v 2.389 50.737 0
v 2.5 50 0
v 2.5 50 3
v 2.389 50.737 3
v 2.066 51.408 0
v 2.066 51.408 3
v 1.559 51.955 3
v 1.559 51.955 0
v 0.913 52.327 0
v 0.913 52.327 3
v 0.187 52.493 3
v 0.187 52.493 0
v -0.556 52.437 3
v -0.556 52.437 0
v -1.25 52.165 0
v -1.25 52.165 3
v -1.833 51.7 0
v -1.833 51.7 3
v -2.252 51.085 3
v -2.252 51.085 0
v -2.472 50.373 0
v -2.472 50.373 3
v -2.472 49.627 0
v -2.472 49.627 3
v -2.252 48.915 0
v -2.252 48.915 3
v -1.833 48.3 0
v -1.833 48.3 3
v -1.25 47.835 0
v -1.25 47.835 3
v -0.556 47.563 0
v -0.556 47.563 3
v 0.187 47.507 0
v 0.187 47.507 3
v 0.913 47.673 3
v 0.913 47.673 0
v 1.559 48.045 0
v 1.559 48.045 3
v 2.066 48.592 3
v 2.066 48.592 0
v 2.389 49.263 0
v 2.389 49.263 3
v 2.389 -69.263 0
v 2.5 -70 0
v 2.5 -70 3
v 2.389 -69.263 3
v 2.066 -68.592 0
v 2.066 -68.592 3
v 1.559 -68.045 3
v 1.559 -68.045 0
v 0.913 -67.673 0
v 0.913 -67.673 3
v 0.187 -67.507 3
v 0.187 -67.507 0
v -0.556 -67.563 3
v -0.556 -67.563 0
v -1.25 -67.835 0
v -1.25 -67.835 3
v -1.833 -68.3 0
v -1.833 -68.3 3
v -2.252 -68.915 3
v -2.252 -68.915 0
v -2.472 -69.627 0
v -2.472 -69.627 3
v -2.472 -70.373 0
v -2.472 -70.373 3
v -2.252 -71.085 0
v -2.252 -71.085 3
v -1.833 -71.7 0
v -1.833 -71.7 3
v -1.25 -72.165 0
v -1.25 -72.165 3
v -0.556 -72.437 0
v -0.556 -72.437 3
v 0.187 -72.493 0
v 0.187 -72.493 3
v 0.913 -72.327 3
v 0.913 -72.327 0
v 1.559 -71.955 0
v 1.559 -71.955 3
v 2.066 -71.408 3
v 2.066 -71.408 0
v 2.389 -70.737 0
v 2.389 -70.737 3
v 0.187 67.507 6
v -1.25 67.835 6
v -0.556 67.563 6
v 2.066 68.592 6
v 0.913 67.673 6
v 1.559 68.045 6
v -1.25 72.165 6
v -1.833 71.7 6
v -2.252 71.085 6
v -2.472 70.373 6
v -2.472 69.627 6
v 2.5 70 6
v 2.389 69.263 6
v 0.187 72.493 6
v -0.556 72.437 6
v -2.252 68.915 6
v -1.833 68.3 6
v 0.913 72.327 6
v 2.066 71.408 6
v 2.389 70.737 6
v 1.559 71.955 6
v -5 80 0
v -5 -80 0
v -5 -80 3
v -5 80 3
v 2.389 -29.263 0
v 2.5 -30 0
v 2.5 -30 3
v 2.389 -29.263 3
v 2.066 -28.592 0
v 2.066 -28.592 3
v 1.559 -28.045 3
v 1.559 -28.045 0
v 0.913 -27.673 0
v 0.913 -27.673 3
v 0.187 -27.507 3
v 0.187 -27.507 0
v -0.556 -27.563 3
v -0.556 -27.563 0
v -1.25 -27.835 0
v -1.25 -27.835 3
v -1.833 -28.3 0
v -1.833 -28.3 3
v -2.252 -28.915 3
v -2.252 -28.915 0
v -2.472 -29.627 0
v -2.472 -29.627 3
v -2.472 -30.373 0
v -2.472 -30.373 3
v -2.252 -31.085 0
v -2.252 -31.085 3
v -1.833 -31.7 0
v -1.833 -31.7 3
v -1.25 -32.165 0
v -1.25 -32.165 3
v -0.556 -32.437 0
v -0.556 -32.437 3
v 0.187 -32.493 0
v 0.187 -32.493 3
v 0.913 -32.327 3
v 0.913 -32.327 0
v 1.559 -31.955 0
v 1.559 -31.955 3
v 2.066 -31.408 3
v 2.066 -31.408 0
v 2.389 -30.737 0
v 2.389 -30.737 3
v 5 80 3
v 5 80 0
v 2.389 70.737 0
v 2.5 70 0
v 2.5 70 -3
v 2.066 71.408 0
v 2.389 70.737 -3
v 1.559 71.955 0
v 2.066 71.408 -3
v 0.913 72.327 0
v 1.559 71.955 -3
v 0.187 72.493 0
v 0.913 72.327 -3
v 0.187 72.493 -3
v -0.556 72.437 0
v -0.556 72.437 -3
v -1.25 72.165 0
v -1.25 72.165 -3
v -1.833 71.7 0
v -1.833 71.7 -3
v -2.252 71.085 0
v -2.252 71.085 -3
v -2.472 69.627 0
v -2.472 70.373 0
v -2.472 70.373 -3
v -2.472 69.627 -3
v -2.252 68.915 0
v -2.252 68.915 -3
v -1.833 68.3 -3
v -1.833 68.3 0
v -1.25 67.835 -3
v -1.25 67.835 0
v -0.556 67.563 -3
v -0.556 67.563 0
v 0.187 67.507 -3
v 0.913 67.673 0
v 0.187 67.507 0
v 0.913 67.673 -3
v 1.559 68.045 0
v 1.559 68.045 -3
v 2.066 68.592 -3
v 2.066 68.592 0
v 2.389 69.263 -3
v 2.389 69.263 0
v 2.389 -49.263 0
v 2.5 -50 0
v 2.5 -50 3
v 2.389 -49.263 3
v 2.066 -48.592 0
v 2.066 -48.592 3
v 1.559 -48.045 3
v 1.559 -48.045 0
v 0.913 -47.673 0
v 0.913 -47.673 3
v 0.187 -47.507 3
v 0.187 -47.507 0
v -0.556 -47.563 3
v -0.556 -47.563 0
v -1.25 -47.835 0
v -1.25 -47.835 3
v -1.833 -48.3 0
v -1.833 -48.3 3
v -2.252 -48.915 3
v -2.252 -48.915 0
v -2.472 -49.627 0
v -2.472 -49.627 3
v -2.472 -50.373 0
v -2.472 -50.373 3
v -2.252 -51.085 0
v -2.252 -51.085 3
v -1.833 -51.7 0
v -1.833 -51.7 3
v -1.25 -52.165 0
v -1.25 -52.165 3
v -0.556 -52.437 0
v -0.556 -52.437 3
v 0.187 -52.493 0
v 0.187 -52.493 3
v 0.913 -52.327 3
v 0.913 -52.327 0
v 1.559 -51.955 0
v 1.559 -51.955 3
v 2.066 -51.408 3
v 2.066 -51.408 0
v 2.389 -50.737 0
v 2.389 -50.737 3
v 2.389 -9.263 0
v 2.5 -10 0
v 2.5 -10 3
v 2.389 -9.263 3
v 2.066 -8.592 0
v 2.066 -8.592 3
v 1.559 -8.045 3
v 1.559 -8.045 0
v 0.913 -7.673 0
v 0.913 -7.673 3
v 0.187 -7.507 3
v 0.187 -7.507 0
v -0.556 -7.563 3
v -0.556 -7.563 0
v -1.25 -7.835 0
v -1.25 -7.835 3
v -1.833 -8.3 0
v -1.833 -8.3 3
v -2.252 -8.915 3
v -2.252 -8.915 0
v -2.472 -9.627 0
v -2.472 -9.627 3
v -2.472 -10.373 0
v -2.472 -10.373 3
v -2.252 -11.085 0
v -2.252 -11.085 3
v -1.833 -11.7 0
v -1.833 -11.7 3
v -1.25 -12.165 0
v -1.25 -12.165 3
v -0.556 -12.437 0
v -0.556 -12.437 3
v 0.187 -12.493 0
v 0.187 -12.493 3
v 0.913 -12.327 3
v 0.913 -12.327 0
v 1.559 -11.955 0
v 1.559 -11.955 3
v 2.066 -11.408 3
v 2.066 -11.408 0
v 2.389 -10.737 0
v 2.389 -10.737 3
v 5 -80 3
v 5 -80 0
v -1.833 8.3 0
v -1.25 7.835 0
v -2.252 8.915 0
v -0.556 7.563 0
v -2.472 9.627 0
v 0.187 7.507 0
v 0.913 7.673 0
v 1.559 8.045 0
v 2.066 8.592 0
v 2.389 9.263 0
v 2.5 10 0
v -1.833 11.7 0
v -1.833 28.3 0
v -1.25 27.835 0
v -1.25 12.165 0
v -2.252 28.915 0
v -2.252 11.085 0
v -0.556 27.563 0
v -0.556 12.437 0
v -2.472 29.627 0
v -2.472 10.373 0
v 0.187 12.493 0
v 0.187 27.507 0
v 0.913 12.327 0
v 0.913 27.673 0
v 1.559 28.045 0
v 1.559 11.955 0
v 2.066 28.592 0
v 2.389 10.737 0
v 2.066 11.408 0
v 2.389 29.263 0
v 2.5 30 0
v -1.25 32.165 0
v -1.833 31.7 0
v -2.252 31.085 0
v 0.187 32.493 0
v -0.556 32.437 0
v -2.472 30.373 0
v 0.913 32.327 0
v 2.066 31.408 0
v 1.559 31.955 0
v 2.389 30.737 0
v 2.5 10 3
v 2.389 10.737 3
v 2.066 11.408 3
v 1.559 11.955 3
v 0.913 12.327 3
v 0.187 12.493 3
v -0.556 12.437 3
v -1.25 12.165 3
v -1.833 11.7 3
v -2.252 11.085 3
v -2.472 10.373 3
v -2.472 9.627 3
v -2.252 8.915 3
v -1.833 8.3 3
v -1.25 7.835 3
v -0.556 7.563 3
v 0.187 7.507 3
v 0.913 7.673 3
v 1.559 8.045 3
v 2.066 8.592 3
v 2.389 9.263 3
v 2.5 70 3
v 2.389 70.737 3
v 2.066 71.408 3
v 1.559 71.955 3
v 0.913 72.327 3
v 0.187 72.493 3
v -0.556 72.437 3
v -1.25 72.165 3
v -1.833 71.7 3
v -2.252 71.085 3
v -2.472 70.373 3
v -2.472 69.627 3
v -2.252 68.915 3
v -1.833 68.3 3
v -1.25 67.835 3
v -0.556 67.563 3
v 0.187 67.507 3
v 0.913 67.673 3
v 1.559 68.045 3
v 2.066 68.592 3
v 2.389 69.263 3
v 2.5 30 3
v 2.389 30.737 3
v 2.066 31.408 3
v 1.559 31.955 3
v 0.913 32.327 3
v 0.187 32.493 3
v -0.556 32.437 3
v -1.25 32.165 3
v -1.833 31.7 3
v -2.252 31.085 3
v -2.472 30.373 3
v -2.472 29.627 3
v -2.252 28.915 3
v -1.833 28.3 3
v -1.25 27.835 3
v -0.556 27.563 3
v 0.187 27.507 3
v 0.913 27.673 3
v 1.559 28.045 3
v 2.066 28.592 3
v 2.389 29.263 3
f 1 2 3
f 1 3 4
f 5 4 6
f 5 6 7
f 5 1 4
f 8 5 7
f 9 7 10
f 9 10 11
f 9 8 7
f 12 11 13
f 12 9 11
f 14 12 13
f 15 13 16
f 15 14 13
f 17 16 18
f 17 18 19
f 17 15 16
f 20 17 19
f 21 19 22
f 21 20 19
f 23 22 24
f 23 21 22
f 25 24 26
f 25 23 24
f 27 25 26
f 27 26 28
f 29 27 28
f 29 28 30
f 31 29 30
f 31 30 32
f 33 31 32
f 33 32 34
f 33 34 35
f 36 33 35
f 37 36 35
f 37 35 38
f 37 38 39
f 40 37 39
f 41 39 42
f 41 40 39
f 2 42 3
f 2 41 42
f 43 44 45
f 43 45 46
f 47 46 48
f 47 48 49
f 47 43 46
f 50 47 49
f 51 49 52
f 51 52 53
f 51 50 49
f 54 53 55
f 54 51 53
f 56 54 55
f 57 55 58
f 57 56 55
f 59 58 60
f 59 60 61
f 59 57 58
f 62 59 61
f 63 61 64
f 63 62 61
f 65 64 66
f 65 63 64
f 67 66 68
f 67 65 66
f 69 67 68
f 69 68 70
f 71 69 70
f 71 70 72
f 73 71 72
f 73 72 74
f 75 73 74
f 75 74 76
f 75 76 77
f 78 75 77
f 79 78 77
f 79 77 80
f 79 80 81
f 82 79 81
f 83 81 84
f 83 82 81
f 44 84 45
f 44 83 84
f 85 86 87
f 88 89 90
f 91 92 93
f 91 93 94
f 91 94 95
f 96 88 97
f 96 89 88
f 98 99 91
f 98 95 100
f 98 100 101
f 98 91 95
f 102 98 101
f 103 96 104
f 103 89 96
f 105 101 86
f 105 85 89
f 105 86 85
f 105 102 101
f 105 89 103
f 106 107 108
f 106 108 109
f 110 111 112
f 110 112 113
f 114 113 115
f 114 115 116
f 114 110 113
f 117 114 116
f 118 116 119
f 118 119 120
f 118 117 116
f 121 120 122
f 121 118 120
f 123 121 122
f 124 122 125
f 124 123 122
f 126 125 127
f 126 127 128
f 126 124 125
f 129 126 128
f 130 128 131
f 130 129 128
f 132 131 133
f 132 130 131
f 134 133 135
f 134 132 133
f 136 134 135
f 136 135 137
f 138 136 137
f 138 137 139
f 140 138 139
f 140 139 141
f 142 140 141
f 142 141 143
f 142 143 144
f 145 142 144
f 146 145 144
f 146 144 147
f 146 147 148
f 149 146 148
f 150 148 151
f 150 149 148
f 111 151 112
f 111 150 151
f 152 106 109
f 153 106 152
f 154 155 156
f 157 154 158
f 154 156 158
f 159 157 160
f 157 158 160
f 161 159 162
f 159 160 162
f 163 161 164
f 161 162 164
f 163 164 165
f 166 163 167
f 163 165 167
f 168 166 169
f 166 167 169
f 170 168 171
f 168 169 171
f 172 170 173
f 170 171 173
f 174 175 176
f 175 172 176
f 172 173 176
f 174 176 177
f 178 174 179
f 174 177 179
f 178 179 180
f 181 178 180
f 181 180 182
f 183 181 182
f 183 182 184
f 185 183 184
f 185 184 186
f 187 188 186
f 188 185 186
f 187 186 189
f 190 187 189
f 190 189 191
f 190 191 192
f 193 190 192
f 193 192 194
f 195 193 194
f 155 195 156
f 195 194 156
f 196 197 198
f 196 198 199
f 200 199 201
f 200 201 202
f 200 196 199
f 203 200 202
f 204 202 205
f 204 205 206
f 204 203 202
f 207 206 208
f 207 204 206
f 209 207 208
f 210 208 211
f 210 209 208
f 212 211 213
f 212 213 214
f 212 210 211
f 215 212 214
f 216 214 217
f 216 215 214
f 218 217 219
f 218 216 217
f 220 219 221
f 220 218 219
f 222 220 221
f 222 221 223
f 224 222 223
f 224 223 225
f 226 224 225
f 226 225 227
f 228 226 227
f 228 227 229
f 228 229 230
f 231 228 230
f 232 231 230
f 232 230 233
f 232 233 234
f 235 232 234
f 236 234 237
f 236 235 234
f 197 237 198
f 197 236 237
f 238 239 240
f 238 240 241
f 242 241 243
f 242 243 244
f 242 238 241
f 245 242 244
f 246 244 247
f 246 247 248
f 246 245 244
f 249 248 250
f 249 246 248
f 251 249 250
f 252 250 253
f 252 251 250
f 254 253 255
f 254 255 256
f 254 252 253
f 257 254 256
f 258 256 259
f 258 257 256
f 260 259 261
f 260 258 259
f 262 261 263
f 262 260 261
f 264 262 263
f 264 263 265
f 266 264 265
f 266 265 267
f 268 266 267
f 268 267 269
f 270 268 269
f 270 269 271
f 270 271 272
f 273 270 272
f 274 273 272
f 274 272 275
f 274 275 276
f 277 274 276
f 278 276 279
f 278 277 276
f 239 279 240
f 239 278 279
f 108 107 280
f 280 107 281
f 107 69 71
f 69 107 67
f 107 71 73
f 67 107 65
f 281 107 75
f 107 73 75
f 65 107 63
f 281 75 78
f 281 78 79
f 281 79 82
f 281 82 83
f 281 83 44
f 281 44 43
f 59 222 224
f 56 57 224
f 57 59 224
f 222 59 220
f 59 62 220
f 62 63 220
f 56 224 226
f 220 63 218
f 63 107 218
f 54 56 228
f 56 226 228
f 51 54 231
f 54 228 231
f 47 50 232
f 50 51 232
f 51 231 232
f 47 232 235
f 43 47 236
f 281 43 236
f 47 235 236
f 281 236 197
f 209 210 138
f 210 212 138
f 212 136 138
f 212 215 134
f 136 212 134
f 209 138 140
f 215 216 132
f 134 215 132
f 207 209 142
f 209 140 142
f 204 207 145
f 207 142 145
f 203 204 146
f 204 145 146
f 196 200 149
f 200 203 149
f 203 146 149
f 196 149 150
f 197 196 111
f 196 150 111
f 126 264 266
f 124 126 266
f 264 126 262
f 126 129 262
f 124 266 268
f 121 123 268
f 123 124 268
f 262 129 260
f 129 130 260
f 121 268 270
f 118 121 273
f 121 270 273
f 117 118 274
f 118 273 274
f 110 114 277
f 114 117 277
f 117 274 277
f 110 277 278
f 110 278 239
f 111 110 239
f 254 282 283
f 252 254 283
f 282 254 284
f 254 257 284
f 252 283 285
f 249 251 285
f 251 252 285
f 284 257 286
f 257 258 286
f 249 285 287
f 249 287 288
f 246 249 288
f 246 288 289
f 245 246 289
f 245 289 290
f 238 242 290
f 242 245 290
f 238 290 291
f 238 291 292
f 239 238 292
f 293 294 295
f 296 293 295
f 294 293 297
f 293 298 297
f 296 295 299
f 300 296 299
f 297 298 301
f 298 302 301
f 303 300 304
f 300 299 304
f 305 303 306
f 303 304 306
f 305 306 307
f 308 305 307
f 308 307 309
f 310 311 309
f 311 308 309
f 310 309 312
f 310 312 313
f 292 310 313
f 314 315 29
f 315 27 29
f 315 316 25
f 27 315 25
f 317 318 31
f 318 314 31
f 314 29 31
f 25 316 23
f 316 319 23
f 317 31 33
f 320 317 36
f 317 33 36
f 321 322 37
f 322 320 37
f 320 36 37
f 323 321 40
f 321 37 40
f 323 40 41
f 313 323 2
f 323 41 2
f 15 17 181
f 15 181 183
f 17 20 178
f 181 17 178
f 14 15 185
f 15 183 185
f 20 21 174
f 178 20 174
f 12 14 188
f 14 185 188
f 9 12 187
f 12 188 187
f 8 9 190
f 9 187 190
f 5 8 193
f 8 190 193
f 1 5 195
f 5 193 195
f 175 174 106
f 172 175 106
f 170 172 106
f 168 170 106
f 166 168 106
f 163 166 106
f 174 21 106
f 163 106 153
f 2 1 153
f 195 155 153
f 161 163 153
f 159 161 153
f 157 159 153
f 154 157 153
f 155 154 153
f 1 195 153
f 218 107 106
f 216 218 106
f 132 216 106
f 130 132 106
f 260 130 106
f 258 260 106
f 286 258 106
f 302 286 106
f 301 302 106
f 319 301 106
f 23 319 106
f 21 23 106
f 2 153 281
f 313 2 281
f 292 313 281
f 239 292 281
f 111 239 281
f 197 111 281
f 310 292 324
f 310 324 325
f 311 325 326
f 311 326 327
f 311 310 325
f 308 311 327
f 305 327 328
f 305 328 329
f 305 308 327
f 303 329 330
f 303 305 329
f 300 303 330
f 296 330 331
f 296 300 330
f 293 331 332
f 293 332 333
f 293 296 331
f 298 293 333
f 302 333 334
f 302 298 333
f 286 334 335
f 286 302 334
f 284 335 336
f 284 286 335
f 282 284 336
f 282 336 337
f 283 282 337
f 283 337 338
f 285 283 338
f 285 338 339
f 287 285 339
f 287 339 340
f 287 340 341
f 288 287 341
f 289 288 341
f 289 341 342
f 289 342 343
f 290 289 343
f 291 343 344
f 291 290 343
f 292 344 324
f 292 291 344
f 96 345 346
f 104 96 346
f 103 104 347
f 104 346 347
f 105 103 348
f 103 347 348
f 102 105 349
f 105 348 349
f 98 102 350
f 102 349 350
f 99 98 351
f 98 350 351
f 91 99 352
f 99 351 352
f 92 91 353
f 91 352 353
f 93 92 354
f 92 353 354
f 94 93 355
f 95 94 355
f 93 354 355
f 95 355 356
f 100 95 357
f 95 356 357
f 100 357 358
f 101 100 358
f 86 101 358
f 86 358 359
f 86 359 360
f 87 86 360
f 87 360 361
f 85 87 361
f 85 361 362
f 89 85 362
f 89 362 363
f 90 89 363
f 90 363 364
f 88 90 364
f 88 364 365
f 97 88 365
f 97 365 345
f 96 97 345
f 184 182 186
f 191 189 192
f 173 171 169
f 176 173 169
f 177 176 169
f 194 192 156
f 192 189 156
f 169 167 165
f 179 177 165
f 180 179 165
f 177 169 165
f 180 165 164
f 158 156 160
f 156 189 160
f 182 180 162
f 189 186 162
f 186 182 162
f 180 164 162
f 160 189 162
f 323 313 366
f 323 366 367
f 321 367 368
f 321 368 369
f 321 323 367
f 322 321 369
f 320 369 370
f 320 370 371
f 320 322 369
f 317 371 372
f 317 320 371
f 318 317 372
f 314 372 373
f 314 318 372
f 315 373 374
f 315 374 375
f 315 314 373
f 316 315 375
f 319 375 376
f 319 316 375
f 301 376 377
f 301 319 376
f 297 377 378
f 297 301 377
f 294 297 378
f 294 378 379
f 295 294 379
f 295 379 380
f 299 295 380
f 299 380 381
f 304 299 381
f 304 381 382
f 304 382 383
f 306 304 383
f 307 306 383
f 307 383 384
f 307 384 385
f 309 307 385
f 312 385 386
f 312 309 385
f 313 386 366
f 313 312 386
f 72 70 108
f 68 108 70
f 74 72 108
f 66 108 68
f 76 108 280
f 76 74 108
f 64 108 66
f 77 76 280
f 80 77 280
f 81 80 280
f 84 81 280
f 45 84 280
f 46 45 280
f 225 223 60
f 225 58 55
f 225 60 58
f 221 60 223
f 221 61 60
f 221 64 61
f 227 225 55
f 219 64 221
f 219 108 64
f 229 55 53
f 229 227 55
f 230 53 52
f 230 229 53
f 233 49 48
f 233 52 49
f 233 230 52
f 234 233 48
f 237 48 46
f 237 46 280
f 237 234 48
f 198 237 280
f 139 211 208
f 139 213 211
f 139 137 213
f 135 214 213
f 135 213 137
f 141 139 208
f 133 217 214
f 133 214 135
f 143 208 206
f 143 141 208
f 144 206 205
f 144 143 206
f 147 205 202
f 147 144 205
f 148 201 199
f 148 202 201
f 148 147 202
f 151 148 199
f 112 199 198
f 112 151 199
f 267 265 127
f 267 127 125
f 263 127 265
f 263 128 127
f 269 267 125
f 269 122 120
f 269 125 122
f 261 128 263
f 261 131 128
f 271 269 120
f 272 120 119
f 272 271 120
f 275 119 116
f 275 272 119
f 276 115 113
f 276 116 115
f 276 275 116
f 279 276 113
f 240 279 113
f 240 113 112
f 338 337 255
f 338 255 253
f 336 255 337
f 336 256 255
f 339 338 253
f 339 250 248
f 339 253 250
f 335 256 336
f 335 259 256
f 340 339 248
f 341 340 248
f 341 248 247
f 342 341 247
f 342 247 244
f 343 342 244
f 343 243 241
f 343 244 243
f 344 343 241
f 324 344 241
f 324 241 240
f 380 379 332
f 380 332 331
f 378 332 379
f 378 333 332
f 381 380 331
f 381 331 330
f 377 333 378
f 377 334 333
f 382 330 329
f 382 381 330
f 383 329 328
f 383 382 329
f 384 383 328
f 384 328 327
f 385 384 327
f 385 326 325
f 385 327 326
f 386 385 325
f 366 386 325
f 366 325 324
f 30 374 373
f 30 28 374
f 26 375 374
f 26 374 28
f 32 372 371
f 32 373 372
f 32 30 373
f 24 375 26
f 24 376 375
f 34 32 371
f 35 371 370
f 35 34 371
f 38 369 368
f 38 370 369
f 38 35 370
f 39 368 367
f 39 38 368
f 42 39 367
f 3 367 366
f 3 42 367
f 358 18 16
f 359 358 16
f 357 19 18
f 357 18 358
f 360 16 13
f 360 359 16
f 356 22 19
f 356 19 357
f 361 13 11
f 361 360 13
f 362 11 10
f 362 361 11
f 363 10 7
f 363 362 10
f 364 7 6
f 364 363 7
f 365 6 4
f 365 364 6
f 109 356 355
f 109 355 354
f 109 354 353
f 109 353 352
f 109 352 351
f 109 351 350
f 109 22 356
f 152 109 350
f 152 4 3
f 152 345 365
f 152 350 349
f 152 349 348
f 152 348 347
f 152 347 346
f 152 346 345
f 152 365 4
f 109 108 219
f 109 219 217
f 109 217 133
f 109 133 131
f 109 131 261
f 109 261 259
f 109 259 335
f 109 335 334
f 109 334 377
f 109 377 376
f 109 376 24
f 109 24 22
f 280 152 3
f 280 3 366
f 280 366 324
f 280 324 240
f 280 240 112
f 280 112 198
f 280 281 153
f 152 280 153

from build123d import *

# Parameters (mm, degrees)
SKETCH_1_W           = 10
SKETCH_1_H           = 160
SKETCH_1_R           = 2.5
EXTRUDE_1_DEPTH      = 3
EXTRUDE_2_DEPTH      = 3
EXTRUDE_2_DEPTH_BACK = 6
SKETCH_2_R           = 2.5


with BuildPart() as part:
    # 草圖1 → 填料-伸長1 (new body)
    with BuildSketch(Plane.XY):
        Rectangle(SKETCH_1_W, SKETCH_1_H)
        with Locations((0, -70)):
            Circle(SKETCH_1_R, mode=Mode.SUBTRACT)
        with Locations((0, -50)):
            Circle(SKETCH_1_R, mode=Mode.SUBTRACT)
        with Locations((0, -30)):
            Circle(SKETCH_1_R, mode=Mode.SUBTRACT)
        with Locations((0, -10)):
            Circle(SKETCH_1_R, mode=Mode.SUBTRACT)
        with Locations((0, 10)):
            Circle(SKETCH_1_R, mode=Mode.SUBTRACT)
        with Locations((0, 30)):
            Circle(SKETCH_1_R, mode=Mode.SUBTRACT)
        with Locations((0, 50)):
            Circle(SKETCH_1_R, mode=Mode.SUBTRACT)
    extrude(amount=EXTRUDE_1_DEPTH)

    # 草圖2 → 填料-伸長2 (add, two sides: drawn at the far end of the back side and taken through both)
    with BuildSketch(Plane.XY.offset(3).offset(-EXTRUDE_2_DEPTH_BACK)):
        with Locations((0, 70)):
            Circle(SKETCH_2_R)
    extrude(amount=EXTRUDE_2_DEPTH + EXTRUDE_2_DEPTH_BACK)


solid = part.part
